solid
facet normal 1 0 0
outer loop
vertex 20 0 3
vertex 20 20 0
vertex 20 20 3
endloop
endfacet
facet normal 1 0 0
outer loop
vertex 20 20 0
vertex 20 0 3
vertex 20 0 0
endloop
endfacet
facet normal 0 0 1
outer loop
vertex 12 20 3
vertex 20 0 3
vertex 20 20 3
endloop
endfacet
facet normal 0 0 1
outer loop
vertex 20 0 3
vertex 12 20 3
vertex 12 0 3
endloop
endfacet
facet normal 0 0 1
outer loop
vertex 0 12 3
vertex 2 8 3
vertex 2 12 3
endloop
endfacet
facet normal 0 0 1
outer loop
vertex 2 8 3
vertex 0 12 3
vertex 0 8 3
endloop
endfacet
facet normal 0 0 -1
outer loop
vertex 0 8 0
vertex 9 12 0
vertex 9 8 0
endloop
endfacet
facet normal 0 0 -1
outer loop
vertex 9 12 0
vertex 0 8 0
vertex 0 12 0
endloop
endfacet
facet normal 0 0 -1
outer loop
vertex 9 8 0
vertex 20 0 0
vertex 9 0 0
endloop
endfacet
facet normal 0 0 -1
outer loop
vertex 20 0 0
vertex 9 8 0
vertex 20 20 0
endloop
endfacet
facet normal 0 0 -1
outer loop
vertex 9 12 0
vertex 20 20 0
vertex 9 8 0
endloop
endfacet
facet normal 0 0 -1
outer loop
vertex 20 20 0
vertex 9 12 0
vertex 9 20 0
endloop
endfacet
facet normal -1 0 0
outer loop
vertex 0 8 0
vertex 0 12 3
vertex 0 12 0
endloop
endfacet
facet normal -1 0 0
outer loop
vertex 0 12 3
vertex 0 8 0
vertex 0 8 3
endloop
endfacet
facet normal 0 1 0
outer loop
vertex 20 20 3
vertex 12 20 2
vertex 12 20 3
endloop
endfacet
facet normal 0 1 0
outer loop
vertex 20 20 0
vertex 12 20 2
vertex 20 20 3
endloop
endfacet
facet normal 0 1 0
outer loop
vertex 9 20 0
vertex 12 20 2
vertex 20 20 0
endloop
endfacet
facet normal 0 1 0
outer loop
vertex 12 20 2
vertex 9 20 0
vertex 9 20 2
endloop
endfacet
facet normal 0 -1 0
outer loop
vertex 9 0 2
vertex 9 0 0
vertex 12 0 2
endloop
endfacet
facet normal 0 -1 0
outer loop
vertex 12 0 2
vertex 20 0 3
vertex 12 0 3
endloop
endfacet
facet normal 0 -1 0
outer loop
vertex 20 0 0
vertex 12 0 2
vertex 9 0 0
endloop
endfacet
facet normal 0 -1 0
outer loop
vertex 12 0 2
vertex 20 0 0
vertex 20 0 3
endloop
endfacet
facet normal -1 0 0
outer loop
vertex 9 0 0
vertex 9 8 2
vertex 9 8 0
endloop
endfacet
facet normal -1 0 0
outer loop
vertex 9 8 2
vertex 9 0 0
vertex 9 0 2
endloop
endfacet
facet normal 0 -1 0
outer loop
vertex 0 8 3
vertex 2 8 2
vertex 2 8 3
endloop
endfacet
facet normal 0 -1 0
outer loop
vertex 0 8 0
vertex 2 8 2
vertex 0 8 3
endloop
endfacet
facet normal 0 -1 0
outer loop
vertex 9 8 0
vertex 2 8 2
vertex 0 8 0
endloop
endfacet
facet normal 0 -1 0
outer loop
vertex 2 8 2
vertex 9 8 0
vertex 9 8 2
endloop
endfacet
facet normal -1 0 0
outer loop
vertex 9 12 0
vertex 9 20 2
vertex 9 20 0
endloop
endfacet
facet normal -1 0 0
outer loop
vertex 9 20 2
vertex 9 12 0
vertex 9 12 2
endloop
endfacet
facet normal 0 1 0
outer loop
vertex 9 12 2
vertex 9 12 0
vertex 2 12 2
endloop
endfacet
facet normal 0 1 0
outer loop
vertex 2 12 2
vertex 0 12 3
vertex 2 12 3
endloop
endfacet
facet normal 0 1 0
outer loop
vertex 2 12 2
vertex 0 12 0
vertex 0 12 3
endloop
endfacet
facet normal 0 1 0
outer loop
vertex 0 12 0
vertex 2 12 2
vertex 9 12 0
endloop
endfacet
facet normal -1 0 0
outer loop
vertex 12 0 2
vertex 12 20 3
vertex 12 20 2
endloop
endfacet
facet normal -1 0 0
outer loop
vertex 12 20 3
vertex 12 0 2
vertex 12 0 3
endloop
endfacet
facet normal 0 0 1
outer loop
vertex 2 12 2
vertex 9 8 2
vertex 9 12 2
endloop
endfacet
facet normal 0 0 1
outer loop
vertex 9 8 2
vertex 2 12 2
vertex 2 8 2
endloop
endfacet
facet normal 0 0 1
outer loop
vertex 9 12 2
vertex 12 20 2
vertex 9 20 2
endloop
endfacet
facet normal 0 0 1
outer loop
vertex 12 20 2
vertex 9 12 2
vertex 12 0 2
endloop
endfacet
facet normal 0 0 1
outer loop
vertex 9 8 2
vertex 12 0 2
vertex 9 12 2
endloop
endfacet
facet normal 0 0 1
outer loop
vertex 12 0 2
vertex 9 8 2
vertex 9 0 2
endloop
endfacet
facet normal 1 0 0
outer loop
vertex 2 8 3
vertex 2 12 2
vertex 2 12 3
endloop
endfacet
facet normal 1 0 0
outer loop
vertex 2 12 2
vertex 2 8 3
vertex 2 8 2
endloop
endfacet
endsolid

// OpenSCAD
difference(){
  cube([20,20,3]);
  
  translate([-1,-2,-0.5])
  cube([10,10,4]);

  translate([-1,14-2,-0.5])
  cube([10,10,4]);

  translate([2,-0.5,2])
  cube([10,21,4]);  
}
